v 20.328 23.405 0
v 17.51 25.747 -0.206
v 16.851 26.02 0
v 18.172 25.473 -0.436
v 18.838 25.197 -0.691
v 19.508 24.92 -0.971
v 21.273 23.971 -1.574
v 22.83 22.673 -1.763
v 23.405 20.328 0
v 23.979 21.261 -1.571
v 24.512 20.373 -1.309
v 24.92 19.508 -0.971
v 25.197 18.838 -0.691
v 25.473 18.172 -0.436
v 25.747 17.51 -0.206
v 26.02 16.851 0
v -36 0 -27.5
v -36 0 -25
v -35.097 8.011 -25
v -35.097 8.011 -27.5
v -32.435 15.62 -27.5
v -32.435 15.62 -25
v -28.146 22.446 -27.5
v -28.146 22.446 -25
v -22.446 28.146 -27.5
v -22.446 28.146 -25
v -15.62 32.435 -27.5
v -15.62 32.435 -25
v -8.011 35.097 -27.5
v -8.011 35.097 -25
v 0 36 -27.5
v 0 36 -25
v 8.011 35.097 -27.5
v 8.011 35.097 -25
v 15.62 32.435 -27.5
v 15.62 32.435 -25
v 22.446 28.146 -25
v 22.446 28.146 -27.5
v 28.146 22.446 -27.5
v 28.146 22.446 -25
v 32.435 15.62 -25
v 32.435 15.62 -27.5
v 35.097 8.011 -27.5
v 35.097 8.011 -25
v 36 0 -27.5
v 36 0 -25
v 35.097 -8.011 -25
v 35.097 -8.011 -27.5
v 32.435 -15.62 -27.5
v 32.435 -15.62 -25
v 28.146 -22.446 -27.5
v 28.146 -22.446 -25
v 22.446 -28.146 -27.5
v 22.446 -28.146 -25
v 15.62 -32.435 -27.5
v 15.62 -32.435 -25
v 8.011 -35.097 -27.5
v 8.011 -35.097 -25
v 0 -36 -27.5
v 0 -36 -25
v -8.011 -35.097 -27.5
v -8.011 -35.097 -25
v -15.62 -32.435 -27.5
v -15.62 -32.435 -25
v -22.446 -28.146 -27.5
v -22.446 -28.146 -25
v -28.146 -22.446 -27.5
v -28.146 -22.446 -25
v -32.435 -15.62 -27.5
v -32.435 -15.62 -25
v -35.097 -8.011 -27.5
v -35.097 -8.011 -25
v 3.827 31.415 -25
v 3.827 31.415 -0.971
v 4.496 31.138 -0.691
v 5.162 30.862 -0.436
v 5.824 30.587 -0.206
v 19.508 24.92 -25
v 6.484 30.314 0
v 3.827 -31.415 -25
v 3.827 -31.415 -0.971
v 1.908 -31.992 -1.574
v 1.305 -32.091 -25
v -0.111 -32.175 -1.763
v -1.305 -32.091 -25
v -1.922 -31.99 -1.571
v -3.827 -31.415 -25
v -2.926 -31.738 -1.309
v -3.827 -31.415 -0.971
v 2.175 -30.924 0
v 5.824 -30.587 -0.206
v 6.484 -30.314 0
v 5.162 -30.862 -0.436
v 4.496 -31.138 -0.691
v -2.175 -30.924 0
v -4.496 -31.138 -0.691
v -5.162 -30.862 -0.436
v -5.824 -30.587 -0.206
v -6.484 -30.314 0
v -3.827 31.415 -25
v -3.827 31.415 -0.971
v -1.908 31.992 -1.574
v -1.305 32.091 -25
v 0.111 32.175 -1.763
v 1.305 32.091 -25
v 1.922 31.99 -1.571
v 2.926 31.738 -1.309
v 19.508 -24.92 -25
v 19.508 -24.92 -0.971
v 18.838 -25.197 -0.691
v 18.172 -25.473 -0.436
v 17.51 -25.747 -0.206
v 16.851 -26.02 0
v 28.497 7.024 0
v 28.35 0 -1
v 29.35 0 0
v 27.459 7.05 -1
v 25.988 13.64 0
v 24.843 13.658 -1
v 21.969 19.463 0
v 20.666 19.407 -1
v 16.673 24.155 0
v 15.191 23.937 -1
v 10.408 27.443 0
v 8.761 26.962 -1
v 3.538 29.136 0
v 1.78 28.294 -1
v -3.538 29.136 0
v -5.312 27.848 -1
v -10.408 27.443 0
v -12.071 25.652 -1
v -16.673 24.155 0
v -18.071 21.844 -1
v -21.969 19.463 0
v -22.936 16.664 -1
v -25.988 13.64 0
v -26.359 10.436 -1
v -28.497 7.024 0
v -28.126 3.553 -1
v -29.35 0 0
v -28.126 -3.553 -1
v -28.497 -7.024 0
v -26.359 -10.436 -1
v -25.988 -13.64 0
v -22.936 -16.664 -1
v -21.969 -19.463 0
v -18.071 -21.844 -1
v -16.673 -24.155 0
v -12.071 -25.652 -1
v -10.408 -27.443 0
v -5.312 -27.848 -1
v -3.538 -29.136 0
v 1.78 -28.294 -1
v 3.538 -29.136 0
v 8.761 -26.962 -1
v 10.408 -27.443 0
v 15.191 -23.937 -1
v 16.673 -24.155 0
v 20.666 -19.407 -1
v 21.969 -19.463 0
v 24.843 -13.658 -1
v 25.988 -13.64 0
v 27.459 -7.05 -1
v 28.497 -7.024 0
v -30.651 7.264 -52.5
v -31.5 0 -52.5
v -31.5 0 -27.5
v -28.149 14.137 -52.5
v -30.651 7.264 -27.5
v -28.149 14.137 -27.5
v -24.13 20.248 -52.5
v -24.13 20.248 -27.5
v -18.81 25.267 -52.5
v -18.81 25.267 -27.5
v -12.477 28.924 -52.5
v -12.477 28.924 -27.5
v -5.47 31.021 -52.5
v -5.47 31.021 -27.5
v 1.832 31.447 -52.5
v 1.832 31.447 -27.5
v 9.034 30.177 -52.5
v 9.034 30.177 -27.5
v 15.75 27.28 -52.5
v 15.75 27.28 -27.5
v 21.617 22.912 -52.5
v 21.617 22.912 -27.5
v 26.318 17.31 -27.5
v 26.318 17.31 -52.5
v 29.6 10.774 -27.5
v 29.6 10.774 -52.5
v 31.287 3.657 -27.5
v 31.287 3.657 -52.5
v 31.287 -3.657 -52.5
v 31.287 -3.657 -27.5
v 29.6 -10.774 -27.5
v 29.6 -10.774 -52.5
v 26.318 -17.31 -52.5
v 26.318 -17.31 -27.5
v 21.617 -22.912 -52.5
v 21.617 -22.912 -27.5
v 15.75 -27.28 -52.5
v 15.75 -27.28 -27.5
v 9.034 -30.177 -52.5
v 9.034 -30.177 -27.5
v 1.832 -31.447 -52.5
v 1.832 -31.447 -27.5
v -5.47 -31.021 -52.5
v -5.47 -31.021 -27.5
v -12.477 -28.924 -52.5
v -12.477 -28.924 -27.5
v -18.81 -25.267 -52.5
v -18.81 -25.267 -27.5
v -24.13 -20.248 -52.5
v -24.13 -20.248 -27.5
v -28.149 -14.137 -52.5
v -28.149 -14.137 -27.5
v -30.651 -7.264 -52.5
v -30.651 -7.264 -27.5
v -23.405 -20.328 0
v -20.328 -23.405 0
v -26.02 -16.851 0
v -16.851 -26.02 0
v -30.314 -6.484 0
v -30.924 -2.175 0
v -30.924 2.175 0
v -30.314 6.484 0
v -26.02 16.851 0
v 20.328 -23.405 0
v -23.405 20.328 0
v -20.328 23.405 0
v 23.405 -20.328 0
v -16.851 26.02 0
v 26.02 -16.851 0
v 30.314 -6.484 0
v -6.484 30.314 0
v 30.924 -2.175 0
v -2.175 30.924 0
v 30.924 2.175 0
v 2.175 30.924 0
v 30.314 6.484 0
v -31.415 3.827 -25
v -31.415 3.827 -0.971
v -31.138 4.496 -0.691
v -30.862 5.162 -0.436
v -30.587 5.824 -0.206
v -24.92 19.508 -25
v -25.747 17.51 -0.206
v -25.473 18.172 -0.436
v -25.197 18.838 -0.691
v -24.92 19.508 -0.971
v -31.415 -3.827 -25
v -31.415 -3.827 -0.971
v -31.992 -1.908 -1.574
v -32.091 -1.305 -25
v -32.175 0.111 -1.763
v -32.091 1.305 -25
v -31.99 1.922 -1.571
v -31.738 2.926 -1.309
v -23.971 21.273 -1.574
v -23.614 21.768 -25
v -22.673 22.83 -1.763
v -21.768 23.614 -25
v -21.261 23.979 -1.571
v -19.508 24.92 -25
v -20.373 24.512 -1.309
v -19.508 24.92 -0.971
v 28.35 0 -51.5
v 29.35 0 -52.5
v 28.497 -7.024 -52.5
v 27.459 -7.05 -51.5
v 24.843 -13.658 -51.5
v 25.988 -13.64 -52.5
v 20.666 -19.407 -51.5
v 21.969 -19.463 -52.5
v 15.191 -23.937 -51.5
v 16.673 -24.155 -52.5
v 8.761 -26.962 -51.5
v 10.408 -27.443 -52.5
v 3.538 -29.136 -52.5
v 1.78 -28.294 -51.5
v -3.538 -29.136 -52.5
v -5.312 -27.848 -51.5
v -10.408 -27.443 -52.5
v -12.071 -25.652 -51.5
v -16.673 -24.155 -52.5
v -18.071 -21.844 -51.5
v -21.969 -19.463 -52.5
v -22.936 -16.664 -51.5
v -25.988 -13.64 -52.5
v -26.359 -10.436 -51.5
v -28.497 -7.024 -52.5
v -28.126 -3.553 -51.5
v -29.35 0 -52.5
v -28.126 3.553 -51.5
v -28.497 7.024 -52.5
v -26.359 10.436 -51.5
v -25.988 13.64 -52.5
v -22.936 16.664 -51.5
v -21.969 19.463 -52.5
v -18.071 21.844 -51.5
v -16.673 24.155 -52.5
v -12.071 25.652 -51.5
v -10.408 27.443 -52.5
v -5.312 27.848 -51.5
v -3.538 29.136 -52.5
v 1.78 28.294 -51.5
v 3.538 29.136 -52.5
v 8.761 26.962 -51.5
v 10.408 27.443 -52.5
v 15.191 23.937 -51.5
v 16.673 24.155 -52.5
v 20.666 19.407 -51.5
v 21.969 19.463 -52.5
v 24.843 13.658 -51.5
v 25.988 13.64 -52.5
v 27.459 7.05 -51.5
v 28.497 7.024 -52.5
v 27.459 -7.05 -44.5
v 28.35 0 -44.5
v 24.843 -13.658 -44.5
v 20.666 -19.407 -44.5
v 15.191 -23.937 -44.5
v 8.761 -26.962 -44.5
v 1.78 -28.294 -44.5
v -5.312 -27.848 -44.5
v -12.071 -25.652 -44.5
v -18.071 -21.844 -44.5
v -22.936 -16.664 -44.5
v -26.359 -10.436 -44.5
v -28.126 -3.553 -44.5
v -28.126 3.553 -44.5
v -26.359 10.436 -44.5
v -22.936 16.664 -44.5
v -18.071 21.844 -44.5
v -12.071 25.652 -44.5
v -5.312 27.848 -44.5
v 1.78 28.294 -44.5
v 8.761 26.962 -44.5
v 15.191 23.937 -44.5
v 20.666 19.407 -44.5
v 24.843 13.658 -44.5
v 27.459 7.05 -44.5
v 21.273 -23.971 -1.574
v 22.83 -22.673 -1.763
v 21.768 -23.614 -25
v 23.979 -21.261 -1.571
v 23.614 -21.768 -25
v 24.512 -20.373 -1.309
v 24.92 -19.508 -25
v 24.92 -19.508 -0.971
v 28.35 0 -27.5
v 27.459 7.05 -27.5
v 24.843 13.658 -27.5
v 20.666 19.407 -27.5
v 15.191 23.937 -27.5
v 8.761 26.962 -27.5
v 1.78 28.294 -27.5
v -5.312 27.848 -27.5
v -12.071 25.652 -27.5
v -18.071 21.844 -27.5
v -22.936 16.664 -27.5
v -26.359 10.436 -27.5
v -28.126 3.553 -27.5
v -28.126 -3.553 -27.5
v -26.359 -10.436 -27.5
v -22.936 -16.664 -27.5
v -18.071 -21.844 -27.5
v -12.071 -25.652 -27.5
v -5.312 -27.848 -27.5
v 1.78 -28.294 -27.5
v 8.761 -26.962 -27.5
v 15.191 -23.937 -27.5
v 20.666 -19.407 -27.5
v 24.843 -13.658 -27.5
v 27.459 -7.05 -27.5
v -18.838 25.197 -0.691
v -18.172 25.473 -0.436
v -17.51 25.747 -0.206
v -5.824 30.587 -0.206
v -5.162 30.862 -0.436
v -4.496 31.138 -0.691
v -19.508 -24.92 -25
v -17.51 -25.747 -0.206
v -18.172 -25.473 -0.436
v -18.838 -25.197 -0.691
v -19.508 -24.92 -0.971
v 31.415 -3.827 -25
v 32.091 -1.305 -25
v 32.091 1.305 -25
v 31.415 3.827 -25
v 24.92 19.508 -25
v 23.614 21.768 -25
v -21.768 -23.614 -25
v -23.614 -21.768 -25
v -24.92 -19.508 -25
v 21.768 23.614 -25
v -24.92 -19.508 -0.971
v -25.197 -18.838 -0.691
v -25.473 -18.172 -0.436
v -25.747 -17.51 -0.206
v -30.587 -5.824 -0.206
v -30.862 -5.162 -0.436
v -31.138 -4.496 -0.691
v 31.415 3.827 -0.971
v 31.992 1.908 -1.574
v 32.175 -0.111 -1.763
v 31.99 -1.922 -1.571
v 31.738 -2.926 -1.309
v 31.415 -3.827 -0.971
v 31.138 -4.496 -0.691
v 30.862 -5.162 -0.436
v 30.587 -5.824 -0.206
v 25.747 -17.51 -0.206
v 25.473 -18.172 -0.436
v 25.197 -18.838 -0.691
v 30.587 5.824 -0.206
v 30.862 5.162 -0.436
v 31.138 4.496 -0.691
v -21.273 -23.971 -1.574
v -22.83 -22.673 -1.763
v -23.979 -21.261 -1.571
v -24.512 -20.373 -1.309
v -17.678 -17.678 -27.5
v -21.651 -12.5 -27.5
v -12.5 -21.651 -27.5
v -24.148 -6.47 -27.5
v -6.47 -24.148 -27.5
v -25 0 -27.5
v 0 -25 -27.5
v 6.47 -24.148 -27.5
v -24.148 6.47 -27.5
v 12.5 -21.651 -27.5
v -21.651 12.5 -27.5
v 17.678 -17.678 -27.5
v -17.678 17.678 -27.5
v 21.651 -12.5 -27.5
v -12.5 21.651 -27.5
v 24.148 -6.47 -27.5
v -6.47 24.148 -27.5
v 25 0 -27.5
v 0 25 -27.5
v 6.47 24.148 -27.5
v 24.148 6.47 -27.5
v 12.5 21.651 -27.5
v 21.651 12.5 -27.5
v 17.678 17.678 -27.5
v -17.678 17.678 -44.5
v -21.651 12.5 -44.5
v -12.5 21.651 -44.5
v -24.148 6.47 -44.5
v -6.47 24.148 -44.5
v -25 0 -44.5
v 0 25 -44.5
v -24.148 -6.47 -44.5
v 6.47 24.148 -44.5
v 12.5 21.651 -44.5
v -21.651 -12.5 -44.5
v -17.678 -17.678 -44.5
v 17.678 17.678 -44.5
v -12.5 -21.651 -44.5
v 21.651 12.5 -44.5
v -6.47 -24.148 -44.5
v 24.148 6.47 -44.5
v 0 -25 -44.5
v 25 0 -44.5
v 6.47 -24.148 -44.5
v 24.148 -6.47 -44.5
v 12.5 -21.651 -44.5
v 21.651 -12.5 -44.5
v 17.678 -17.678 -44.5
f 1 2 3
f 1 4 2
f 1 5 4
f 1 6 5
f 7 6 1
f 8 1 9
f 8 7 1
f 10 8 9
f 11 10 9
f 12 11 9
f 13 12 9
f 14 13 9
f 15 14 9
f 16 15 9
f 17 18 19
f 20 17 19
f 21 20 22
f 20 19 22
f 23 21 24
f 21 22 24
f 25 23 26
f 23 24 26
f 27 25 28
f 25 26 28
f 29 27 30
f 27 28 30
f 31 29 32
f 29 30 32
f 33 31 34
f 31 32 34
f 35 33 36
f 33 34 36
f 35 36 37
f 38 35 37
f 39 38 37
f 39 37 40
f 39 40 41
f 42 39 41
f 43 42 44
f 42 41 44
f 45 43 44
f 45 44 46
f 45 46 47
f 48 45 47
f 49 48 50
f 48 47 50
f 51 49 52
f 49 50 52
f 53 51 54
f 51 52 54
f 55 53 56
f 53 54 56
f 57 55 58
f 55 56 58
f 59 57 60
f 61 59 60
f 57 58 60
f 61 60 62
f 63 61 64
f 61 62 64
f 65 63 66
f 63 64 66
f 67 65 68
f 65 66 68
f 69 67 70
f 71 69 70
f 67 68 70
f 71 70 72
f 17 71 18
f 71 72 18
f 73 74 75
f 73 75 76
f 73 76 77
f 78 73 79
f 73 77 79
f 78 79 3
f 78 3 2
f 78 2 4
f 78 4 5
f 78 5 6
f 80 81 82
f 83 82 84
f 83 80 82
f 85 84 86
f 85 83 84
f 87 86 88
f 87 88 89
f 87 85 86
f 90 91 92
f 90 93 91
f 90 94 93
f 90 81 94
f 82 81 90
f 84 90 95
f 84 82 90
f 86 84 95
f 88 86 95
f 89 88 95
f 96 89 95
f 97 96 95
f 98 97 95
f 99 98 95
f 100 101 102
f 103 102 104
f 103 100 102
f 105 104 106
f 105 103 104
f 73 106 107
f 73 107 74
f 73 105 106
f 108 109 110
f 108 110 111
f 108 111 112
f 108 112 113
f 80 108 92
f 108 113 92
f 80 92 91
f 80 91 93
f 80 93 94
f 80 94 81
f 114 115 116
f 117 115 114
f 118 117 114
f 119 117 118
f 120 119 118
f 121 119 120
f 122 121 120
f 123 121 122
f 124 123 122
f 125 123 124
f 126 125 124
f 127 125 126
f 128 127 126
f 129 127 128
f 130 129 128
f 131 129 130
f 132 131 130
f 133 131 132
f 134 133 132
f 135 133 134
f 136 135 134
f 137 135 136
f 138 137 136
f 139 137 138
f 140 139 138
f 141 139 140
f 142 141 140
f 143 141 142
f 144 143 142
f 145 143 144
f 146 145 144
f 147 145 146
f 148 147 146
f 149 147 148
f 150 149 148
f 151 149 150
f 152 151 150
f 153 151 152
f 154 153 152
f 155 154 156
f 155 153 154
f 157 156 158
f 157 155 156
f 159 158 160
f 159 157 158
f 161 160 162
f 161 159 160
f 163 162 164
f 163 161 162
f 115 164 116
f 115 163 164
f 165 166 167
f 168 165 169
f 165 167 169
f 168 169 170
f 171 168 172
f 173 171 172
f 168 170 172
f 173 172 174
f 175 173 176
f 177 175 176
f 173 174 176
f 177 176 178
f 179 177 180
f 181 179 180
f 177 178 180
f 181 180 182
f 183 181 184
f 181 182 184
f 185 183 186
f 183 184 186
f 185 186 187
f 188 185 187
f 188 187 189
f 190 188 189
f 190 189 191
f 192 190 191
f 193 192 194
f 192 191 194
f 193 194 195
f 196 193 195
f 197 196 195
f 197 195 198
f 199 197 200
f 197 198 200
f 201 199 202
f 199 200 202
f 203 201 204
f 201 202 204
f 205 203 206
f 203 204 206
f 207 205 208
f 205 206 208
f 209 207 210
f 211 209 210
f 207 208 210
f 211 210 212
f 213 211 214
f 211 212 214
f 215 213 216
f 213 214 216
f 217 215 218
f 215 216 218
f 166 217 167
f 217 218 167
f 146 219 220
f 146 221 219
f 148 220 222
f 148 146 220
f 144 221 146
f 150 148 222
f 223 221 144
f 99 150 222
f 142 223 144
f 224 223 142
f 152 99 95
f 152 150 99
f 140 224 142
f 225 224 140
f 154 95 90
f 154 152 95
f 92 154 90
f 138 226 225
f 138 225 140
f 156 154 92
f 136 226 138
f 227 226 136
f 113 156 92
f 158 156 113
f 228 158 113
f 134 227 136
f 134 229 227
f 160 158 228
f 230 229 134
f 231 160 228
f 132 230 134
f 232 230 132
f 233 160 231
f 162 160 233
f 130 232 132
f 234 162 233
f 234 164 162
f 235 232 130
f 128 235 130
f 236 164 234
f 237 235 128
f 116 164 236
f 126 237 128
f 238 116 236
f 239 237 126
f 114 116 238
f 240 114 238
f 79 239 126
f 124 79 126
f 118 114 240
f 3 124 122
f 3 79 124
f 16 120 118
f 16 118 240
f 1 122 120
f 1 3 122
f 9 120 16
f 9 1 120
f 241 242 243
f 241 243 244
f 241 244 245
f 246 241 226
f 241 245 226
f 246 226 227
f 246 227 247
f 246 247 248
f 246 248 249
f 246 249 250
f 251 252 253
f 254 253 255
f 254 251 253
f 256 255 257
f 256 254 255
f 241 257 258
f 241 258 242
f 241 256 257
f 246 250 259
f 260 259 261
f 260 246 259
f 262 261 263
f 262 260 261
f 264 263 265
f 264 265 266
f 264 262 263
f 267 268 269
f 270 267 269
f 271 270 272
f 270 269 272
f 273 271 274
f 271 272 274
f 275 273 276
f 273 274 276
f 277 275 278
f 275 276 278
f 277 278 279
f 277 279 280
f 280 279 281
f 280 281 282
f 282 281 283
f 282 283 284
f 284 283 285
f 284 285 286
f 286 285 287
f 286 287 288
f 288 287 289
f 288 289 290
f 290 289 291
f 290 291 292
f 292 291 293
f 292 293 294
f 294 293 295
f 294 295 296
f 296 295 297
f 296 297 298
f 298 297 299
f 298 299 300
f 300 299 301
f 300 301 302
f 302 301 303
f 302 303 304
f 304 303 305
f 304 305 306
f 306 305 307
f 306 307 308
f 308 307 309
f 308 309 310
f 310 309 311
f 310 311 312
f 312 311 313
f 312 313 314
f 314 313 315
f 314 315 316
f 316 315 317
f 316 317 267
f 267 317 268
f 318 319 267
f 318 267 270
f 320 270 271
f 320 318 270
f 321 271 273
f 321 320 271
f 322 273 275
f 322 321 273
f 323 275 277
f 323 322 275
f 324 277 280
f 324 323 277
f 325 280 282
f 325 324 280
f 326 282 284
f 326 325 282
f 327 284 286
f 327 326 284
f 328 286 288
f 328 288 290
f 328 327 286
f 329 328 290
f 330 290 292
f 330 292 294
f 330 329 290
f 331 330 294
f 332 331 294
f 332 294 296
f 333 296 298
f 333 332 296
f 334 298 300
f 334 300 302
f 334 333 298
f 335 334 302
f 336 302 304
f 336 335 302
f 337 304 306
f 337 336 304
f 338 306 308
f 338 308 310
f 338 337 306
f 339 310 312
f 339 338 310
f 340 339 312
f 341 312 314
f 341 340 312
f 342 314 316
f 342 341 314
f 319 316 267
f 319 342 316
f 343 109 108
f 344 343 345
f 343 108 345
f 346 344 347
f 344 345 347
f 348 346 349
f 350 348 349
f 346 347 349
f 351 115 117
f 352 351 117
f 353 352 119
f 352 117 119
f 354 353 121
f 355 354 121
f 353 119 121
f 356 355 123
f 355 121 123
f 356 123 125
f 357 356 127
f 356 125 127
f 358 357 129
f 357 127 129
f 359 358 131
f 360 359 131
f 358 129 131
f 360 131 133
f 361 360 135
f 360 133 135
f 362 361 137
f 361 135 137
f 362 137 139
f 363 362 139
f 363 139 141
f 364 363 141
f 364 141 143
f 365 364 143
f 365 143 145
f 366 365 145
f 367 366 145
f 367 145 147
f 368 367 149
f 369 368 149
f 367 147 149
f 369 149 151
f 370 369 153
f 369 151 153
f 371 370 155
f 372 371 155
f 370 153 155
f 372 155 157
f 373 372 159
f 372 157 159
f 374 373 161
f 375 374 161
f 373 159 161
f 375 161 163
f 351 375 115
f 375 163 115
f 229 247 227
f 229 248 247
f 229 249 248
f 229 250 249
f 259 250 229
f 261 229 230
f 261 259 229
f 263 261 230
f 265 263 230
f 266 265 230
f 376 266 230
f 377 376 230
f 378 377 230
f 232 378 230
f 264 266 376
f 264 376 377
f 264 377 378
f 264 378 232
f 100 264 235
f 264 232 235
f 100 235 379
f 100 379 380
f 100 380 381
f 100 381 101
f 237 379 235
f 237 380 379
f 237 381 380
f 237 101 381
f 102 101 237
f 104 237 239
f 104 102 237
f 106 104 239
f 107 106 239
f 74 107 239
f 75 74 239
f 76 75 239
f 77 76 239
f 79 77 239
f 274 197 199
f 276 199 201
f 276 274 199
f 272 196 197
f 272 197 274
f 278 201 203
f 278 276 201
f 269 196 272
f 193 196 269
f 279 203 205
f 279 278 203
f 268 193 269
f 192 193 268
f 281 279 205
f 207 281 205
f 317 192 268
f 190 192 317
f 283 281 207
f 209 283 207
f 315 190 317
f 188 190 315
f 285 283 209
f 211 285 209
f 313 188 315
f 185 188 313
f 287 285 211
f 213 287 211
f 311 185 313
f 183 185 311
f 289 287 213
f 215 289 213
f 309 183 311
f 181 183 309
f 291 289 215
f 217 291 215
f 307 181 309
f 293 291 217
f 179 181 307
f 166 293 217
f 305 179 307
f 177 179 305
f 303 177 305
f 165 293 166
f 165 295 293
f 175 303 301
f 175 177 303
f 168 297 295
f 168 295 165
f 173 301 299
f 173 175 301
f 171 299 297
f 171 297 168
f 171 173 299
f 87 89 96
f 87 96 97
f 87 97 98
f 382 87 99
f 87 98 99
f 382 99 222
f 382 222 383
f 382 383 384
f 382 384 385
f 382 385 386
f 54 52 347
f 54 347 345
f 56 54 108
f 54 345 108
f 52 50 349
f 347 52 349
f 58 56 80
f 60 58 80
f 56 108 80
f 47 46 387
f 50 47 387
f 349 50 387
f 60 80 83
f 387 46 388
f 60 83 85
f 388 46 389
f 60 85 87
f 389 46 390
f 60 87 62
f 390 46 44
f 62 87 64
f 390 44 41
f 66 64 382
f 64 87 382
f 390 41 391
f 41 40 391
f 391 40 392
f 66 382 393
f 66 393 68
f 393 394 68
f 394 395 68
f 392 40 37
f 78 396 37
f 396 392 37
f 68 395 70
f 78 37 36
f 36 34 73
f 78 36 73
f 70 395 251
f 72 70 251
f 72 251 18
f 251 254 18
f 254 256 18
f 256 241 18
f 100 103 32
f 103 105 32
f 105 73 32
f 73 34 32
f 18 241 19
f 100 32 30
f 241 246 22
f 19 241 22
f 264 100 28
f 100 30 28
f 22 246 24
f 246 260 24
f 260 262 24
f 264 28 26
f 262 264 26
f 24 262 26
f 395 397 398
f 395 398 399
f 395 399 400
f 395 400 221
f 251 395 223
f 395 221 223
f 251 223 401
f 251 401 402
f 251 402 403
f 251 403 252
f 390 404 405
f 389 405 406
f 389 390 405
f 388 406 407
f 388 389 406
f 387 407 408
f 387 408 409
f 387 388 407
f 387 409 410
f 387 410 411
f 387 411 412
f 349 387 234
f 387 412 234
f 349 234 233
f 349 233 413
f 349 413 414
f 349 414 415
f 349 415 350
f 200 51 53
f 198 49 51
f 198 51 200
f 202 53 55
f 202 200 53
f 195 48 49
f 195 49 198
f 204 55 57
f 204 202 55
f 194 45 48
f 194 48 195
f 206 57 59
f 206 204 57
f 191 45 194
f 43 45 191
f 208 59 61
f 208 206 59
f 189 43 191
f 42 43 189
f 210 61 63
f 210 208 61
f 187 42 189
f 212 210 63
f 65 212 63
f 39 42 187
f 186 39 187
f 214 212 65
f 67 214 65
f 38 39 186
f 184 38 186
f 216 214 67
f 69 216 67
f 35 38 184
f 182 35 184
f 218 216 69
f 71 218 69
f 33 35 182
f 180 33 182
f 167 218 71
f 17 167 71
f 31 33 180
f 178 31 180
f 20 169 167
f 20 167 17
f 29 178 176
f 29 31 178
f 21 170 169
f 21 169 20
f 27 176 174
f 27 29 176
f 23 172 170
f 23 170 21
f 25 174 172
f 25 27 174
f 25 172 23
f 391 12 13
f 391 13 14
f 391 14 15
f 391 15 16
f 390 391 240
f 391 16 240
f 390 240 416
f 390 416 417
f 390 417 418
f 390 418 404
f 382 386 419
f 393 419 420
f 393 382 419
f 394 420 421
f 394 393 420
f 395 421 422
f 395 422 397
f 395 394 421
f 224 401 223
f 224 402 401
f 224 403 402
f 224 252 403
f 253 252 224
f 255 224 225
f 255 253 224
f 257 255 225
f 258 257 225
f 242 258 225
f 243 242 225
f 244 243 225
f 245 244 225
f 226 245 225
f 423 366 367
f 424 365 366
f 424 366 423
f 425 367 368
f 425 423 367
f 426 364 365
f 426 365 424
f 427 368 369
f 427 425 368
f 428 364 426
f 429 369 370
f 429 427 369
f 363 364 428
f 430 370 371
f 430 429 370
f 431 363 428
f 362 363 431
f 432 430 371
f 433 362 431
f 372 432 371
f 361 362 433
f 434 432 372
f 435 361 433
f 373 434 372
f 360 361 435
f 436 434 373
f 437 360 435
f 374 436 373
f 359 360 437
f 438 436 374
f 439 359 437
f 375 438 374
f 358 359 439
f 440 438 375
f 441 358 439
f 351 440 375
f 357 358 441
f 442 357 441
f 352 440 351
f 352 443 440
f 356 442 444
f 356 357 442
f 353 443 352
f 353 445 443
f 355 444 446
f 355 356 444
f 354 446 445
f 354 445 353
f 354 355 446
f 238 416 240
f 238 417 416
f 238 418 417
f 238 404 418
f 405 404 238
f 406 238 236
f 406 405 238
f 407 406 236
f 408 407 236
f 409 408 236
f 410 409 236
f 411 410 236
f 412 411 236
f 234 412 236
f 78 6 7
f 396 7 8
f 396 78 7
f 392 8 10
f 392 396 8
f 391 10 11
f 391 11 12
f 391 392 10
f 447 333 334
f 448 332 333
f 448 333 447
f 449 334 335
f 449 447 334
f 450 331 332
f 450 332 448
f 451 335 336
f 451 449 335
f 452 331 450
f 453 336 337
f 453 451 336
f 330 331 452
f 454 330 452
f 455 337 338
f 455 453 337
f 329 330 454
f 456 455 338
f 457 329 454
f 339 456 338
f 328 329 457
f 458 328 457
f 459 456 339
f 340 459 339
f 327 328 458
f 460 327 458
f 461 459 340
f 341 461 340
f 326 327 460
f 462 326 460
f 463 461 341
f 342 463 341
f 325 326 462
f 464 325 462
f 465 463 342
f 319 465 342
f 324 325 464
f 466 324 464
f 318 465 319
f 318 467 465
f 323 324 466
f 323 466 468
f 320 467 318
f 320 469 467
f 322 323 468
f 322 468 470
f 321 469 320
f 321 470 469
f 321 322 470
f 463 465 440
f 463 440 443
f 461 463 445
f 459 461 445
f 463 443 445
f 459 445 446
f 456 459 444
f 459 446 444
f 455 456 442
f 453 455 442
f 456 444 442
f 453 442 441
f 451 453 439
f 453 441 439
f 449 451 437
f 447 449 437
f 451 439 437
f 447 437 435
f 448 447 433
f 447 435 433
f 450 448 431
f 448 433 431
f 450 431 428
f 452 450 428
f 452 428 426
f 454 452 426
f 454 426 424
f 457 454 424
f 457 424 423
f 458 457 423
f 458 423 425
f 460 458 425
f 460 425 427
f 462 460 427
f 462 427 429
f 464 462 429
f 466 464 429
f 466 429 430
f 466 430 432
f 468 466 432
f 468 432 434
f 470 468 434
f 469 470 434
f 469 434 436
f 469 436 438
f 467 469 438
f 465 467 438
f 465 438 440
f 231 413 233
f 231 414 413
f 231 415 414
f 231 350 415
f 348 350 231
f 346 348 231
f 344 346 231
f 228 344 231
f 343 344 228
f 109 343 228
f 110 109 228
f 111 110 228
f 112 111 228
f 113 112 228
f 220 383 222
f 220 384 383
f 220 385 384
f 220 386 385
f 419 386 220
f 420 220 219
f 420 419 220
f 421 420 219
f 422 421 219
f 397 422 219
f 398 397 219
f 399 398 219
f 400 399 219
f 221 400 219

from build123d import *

# Parameters (mm, degrees)
SZKIC1_R                    = 33
DODANIE_WYCI_GNI_CIE1_DEPTH = 25
SZKIC2_R                    = 36
DODANIE_WYCI_GNI_CIE2_DEPTH = 2.5
SZKIC4_R                    = 31.5
DODANIE_WYCI_GNI_CIE3_DEPTH = 25
SZKIC11_R                   = 28.35
WYTNIJ_WYCI_GNI_CIE5_DEPTH  = 27.5
SZKIC12_R                   = 25
WYTNIJ_WYCI_GNI_CIE6_DEPTH  = 27.5
WYTNIJ_WYCI_GNI_CIE7_START  = -8
SZKIC13_R                   = 28.35
WYTNIJ_WYCI_GNI_CIE7_DEPTH  = 8
SFAZOWANIE1_SIZE            = 1
SFAZOWANIE2_SIZE            = 1
WYTNIJ_WYCI_GNI_CIE11_DEPTH = 25
ZAOKR_GLENIE1_R             = 10


with BuildPart() as part:
    # Szkic1 → Dodanie-wyciągnięcie1 (new body)
    with BuildSketch(Plane.XY):
        Circle(SZKIC1_R)
    extrude(amount=-DODANIE_WYCI_GNI_CIE1_DEPTH)

    # Szkic2 → Dodanie-wyciągnięcie2 (add)
    with BuildSketch(Plane(origin=(0, 0, -25), x_dir=(-1, 0, 0), z_dir=(0, 0, -1))):
        Circle(SZKIC2_R)
    extrude(amount=DODANIE_WYCI_GNI_CIE2_DEPTH)

    # Szkic4 → Dodanie-wyciągnięcie3 (add)
    with BuildSketch(Plane(origin=(0, 0, -27.5), x_dir=(-1, 0, 0), z_dir=(0, 0, -1))):
        Circle(SZKIC4_R)
    extrude(amount=DODANIE_WYCI_GNI_CIE3_DEPTH)

    # Szkic11 → Wytnij-wyciągnięcie5 (cut)
    with BuildSketch(Plane.XY):
        Circle(SZKIC11_R)
    extrude(amount=-WYTNIJ_WYCI_GNI_CIE5_DEPTH, mode=Mode.SUBTRACT)

    # Szkic12 → Wytnij-wyciągnięcie6 (cut)
    with BuildSketch(Plane.XY.offset(-27.5)):
        Circle(SZKIC12_R)
    extrude(amount=-WYTNIJ_WYCI_GNI_CIE6_DEPTH, mode=Mode.SUBTRACT)

    # Szkic13 → Wytnij-wyciągnięcie7 (cut)
    with BuildSketch(Plane(origin=(0, 0, -52.5), x_dir=(-1, 0, 0), z_dir=(0, 0, -1)).offset(WYTNIJ_WYCI_GNI_CIE7_START)):
        with Locations(Location((0, 0, 0), (0, 0, 180))):
            Circle(SZKIC13_R)
    extrude(amount=WYTNIJ_WYCI_GNI_CIE7_DEPTH, mode=Mode.SUBTRACT)

    # Sfazowanie1
    sfazowanie1_edges = [part.edges().sort_by_distance(p)[0] for p in [
        (-28.35, 0, 0),
    ]]
    chamfer(sfazowanie1_edges, length=SFAZOWANIE1_SIZE)

    # Sfazowanie2
    sfazowanie2_edges = [part.edges().sort_by_distance(p)[0] for p in [
        (-28.35, 0, -52.5),
    ]]
    chamfer(sfazowanie2_edges, length=SFAZOWANIE2_SIZE)

    # Szkic10 → Wytnij-wyciągnięcie11 (cut)
    with BuildSketch(Plane.XY):
        with BuildLine():
            Line((-23.334523779, -23.334523779), (-33, 0))
            ThreePointArc((-33, 0), (-30.488024573, -12.628553268), (-23.334523779, -23.334523779))
        make_face()
        with BuildLine():
            Line((-33, 0), (-23.334523779, 23.334523779))
            ThreePointArc((-23.334523779, 23.334523779), (-30.488024573, 12.628553268), (-33, 0))
        make_face()
        with BuildLine():
            Line((0, -33), (-23.334523779, -23.334523779))
            ThreePointArc((-23.334523779, -23.334523779), (-12.628553268, -30.488024573), (0, -33))
        make_face()
        with BuildLine():
            ThreePointArc((0, -33), (12.628553268, -30.488024573), (23.334523779, -23.334523779))
            Line((23.334523779, -23.334523779), (0, -33))
        make_face()
        with BuildLine():
            ThreePointArc((23.334523779, -23.334523779), (30.488024573, -12.628553268), (33, 0))
            Line((33, 0), (23.334523779, -23.334523779))
        make_face()
        with BuildLine():
            ThreePointArc((33, 0), (30.488024573, 12.628553268), (23.334523779, 23.334523779))
            Line((23.334523779, 23.334523779), (33, 0))
        make_face()
        with BuildLine():
            ThreePointArc((23.334523779, 23.334523779), (12.628553268, 30.488024573), (0, 33))
            Line((0, 33), (23.334523779, 23.334523779))
        make_face()
        with BuildLine():
            Line((-23.334523779, 23.334523779), (0, 33))
            ThreePointArc((0, 33), (-12.628553268, 30.488024573), (-23.334523779, 23.334523779))
        make_face()
    extrude(amount=-WYTNIJ_WYCI_GNI_CIE11_DEPTH, mode=Mode.SUBTRACT)

    # Szkic14 → Wycięcie-obrót3 (revolve, cut)
    with BuildSketch(Plane(origin=(0, 0, 0), x_dir=(0, 0, -1), z_dir=(1, 0, 0)), mode=Mode.PRIVATE) as wyci_cie_obr_t3_sk:
        Polygon((0, 33), (0, 31), (3, 33), align=None)
    revolve(wyci_cie_obr_t3_sk.sketch.rotate(Axis((0, 0, 0), (0, 0, -1)), 270), axis=Axis((0, 0, 0), (0, 0, -1)), mode=Mode.SUBTRACT)

    # Zaokrąglenie1
    zaokr_glenie1_edges = [part.edges().sort_by_distance(p)[0] for p in [
        (-23.334523779, 23.334523779, -14),
        (0, 33, -14),
        (23.334523779, 23.334523779, -14),
        (33, 0, -14),
        (23.334523779, -23.334523779, -14),
        (0, -33, -14),
        (-23.334523779, -23.334523779, -14),
        (-33, 0, -14),
    ]]
    fillet(zaokr_glenie1_edges, radius=ZAOKR_GLENIE1_R)


solid = part.part
